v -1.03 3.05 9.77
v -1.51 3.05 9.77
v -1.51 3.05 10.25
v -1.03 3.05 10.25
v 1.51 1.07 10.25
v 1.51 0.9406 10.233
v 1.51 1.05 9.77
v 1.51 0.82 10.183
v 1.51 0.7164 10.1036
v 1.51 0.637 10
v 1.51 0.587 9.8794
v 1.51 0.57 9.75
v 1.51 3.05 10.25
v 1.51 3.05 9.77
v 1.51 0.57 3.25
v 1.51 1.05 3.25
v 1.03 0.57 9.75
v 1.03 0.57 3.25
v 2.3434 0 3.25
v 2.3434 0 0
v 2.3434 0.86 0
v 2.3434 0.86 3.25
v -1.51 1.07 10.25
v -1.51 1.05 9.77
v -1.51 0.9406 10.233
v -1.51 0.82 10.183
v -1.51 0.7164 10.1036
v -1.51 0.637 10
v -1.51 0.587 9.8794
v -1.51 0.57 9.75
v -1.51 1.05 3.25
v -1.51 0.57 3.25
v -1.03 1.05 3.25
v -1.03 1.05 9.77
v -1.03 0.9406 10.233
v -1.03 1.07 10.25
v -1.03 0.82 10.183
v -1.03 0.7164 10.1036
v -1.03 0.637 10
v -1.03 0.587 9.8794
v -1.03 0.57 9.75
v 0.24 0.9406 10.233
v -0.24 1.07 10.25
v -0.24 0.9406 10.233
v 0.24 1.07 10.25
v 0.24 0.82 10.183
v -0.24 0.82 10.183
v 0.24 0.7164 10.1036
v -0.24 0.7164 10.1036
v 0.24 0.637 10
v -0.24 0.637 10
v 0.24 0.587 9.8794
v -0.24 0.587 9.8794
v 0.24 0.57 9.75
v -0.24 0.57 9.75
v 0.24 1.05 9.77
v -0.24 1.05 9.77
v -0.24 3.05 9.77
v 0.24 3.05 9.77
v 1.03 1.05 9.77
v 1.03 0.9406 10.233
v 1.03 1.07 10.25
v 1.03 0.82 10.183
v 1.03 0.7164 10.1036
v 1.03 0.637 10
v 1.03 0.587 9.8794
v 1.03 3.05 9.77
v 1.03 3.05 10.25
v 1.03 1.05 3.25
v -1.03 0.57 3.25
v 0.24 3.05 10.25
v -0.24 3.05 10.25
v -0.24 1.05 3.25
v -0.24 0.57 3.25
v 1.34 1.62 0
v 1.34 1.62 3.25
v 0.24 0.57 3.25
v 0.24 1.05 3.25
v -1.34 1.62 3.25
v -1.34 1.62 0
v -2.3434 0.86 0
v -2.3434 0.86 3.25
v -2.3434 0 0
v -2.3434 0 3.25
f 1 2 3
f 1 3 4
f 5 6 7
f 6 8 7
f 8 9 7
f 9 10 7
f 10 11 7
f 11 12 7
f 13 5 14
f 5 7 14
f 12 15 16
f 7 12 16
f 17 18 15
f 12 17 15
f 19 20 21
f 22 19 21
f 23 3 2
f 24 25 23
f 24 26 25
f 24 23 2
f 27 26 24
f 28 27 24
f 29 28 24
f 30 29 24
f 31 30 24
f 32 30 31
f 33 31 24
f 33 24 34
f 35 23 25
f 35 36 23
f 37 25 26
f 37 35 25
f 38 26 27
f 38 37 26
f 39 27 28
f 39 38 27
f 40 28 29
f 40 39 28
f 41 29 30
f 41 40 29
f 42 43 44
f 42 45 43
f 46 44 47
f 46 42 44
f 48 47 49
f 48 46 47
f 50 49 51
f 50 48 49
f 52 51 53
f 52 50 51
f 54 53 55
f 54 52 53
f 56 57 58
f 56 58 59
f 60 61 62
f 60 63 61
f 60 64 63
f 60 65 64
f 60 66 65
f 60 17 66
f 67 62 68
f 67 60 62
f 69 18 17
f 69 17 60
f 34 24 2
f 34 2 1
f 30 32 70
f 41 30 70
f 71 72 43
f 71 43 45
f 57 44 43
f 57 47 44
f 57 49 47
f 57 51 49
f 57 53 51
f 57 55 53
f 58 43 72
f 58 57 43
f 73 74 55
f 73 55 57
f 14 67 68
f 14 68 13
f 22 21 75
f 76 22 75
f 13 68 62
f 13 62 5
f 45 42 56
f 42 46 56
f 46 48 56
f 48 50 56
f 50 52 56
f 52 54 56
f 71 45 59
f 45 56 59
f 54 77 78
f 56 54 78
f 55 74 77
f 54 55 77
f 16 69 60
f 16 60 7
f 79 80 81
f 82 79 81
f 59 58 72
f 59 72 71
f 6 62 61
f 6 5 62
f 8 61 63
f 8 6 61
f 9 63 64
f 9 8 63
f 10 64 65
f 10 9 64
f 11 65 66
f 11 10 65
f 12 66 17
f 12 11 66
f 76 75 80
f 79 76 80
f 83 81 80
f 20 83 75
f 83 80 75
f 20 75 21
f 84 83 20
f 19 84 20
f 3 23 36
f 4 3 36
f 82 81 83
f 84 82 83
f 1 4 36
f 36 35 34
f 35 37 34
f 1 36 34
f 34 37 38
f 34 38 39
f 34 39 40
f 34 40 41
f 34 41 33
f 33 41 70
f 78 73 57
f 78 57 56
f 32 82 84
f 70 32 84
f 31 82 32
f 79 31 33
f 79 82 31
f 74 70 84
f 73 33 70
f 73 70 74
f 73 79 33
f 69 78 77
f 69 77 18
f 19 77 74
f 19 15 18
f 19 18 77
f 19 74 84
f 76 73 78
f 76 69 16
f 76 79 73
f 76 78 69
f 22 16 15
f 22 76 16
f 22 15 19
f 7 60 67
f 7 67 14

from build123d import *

# Parameters (mm, degrees)
SALIENTE_EXTRUIR1_DEPTH = 3.25
CROQUIS3_W              = 0.48
CROQUIS3_H              = 0.48
SALIENTE_EXTRUIR2_DEPTH = 7
CROQUIS4_W              = 0.48
CROQUIS4_H              = 0.48
SALIENTE_EXTRUIR3_DEPTH = 2
REDONDEO1_R             = 0.5


with BuildPart() as part:
    # Croquis2 → Saliente-Extruir1 (new body)
    with BuildSketch(Plane.XY):
        Polygon((-2.343416672, 0), (2.343416672, 0), (2.343416672, 0.86), (1.34, 1.62), (-1.34, 1.62), (-2.343416672, 0.86), align=None)
    extrude(amount=SALIENTE_EXTRUIR1_DEPTH)

    # Croquis3 → Saliente-Extruir2 (add)
    with BuildSketch(Plane.XY.offset(3.25)):
        with Locations((0, 0.81)):
            Rectangle(CROQUIS3_W, CROQUIS3_H)
        with Locations((1.27, 0.81)):
            Rectangle(CROQUIS3_W, CROQUIS3_H)
        with Locations((-1.27, 0.81)):
            Rectangle(CROQUIS3_W, CROQUIS3_H)
    extrude(amount=SALIENTE_EXTRUIR2_DEPTH)

    # Croquis4 → Saliente-Extruir3 (add)
    with BuildSketch(Plane(origin=(0, 1.05, 0), x_dir=(1, 0, 0), z_dir=(0, 1, 0))):
        with Locations((-1.27, -10.01)):
            Rectangle(CROQUIS4_W, CROQUIS4_H)
        with Locations((0, -10.01)):
            Rectangle(CROQUIS4_W, CROQUIS4_H)
        with Locations((1.27, -10.01)):
            Rectangle(CROQUIS4_W, CROQUIS4_H)
    extrude(amount=SALIENTE_EXTRUIR3_DEPTH)

    # Redondeo1
    redondeo1_edges = [part.edges().sort_by_distance(p)[0] for p in [
        (0, 0.57, 10.25),
        (1.27, 0.57, 10.25),
        (-1.27, 0.57, 10.25),
    ]]
    fillet(redondeo1_edges, radius=REDONDEO1_R)


solid = part.part
